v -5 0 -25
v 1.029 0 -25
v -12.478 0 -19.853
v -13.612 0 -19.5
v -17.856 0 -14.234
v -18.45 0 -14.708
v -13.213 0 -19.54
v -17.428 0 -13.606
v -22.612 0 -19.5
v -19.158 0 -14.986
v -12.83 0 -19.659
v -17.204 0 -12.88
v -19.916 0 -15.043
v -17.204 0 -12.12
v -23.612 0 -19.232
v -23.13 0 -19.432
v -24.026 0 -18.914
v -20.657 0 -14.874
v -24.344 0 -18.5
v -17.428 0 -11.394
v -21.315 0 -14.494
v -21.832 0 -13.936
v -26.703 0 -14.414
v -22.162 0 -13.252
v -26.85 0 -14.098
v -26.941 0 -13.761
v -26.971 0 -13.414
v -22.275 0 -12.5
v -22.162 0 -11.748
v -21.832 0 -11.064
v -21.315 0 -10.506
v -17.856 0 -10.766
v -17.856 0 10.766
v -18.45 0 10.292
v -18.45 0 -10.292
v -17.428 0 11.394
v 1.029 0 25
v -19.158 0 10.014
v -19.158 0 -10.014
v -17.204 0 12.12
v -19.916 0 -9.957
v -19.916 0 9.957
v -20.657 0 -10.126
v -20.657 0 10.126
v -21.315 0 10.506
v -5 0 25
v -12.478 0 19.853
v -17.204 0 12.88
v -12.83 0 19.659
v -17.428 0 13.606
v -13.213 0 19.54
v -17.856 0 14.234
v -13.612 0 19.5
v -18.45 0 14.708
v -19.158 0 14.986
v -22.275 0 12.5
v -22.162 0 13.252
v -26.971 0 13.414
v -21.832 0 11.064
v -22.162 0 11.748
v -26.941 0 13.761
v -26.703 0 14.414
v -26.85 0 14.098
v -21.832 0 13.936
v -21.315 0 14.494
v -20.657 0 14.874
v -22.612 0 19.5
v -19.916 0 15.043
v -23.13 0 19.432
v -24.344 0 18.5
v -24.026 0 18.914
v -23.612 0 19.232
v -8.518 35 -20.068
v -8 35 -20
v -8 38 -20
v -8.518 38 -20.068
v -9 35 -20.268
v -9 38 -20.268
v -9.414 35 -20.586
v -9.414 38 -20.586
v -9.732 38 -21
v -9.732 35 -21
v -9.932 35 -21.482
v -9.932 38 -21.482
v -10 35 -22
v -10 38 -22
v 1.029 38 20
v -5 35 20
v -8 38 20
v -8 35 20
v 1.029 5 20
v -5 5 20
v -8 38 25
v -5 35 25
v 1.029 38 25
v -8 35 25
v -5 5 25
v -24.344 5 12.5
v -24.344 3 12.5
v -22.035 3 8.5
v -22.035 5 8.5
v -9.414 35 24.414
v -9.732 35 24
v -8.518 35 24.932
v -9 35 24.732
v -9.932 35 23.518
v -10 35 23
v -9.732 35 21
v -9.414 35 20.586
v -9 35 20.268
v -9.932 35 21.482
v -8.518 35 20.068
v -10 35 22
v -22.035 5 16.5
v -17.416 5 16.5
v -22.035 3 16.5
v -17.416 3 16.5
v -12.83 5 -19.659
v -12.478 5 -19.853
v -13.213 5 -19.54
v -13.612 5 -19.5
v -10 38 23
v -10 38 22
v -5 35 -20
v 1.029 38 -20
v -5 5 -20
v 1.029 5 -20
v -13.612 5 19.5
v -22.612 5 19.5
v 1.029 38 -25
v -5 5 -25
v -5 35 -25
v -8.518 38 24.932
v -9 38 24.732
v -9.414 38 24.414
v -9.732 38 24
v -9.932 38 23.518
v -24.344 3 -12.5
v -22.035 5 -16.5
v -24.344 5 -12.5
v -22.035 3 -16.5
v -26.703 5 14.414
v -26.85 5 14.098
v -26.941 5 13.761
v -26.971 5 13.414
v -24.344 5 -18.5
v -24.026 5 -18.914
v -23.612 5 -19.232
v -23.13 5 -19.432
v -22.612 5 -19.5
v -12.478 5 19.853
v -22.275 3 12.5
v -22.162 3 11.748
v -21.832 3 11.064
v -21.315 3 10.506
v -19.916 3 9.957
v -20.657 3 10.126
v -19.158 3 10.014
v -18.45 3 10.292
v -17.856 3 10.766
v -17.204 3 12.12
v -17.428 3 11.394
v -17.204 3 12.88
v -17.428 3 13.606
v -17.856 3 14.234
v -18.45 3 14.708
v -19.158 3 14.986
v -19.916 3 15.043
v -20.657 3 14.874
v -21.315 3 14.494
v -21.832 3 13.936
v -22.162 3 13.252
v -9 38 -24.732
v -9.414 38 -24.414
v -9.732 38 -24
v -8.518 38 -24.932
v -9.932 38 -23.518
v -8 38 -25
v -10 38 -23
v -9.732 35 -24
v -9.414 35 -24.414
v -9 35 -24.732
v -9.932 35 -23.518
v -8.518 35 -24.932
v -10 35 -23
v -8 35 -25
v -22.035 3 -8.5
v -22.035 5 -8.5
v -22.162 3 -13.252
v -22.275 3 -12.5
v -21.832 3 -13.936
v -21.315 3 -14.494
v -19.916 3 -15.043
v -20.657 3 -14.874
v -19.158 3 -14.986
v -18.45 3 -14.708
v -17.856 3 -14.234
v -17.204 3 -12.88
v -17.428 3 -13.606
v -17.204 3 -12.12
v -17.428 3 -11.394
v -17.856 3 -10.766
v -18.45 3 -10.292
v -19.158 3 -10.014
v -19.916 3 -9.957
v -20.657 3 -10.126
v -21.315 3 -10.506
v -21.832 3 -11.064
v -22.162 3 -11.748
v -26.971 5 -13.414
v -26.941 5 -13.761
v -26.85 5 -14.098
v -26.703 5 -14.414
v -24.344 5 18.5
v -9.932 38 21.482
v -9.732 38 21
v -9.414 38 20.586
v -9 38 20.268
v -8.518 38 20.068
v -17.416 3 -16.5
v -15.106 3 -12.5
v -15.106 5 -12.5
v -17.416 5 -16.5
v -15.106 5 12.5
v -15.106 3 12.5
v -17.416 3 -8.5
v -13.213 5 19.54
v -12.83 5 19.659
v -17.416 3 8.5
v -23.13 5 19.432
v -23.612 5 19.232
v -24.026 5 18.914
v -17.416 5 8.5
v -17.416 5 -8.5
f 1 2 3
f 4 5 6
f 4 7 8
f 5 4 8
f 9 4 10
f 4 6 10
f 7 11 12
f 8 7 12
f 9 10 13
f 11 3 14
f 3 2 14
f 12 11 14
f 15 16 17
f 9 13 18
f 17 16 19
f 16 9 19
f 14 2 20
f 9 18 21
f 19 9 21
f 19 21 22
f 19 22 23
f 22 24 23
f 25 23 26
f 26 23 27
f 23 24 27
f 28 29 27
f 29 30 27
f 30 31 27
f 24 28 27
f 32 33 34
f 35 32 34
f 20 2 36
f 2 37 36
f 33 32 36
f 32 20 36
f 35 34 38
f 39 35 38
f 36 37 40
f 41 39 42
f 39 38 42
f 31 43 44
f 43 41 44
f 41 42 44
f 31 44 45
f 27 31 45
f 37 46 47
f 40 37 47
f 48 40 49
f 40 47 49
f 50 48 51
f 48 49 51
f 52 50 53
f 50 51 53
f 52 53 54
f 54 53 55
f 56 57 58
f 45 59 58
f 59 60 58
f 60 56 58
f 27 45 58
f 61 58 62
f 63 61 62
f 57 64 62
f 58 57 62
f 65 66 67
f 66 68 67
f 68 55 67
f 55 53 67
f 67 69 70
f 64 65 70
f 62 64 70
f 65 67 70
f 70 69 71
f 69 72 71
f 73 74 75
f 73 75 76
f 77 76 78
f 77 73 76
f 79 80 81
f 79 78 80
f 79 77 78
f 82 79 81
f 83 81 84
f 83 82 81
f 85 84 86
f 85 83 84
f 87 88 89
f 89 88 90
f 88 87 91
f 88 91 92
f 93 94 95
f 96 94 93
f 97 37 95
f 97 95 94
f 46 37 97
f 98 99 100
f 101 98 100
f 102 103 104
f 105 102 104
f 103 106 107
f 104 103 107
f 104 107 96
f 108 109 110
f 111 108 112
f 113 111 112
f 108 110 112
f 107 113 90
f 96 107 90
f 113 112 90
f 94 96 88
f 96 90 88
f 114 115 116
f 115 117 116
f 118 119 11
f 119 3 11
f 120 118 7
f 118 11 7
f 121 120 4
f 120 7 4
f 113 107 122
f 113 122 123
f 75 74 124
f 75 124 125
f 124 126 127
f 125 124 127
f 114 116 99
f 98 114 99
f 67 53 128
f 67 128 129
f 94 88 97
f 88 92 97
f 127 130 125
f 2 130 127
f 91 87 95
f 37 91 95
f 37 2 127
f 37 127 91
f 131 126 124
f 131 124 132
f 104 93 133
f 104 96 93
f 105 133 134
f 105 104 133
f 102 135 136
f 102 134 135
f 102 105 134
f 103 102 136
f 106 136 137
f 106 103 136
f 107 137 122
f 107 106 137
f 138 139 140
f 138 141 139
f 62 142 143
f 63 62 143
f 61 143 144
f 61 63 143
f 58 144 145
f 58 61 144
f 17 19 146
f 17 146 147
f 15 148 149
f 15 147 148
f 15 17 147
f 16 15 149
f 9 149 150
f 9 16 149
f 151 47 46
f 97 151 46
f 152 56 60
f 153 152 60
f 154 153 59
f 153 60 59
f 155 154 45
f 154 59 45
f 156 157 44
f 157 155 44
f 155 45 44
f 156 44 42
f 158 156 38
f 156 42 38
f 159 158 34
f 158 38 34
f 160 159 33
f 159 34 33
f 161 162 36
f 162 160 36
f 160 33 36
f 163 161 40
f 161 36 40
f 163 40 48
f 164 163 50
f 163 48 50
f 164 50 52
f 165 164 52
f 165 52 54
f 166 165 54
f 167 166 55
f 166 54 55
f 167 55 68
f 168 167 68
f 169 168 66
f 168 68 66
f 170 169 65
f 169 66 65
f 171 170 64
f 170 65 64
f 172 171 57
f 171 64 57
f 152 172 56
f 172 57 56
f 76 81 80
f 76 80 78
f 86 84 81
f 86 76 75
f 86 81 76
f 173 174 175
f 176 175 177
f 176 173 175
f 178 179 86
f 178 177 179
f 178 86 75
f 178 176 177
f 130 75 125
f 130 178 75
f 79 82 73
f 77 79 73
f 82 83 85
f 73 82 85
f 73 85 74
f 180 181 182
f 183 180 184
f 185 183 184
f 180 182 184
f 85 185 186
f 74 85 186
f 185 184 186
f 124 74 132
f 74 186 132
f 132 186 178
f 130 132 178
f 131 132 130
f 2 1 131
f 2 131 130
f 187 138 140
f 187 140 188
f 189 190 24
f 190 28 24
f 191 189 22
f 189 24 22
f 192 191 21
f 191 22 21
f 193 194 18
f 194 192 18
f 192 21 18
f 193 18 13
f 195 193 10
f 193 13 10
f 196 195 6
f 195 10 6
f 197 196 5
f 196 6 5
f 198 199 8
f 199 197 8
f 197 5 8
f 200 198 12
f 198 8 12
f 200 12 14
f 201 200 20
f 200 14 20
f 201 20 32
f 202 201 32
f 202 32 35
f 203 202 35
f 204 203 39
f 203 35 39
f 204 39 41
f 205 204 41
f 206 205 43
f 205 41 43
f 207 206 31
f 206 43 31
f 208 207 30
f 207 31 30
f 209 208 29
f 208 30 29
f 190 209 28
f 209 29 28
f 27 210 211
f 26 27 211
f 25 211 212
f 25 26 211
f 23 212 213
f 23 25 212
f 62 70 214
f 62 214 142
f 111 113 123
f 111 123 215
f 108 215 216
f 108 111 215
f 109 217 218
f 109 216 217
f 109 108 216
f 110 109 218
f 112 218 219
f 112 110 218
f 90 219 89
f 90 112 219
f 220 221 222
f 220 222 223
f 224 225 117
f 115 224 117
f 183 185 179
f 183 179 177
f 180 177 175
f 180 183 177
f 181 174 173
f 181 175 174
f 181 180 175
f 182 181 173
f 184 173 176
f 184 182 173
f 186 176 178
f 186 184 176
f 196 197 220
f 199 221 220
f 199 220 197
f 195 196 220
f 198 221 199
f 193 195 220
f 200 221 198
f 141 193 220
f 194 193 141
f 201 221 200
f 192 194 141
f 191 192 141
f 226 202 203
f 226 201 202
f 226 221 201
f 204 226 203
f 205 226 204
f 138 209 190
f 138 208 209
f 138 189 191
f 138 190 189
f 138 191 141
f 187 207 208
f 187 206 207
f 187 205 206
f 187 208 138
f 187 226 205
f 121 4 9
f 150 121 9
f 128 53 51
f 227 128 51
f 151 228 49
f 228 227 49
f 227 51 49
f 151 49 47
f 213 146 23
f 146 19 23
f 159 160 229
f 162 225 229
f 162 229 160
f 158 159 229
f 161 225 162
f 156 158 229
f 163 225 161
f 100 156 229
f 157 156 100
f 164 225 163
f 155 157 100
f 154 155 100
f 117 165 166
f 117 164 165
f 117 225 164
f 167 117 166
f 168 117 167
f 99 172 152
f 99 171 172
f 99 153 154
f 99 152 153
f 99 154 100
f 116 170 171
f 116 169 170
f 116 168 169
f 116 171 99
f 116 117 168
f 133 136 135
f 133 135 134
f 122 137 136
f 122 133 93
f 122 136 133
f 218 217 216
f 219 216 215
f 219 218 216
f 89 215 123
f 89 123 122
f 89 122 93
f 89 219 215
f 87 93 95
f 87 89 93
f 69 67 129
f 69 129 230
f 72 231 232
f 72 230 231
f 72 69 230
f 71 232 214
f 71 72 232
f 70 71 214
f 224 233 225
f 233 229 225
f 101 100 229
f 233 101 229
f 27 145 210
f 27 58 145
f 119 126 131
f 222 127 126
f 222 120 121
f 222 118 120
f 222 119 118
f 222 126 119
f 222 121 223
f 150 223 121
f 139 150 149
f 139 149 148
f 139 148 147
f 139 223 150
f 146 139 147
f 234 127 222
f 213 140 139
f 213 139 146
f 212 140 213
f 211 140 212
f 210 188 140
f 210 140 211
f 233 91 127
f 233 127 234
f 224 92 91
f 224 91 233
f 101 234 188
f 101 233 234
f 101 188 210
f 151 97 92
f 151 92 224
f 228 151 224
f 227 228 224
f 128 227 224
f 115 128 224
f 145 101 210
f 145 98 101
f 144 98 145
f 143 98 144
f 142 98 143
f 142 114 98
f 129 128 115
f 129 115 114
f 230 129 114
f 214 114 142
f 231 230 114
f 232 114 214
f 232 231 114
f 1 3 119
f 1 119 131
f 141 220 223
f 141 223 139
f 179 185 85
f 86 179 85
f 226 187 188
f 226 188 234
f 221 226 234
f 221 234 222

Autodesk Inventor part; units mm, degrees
ref_plane "YZ Plane" through (0, 0, 0) normal (1, 0, 0) x (0, 1, 0)
ref_plane "XZ Plane" through (0, 0, 0) normal (0, 1, 0) x (-1, 0, 0)
ref_plane "XY Plane" through (0, 0, 0) normal (0, 0, 1) x (1, 0, 0)
sketch "Sketch2" plane through (0, 0, 0) normal (0, 1, 0) x (-1, 0, 0)
  line L0 (15.1065, 12.5) -> (17.4159, 16.5)
  line L1 (17.4159, 16.5) -> (22.0347, 16.5)
  line L2 (22.0347, 16.5) -> (24.3441, 12.5)
  line L3 (24.3441, 12.5) -> (22.0347, 8.5)
  line L4 (22.0347, 8.5) -> (17.4159, 8.5)
  line L5 (17.4159, 8.5) -> (15.1065, 12.5)
  circle A0 centre (19.7253, 12.5) radius 2.55
  line L6 (13.6122, 19.5) -> (22.612, 19.5)
  line L7 (24.3441, 18.5) -> (26.7031, 14.414)
  line L8 (26.9711, 13.414) -> (26.9711, 0.8204)
  line L9 (13.6122, 19.5) -> (13.6603, 19.5)
  line L10 (0, 0) -> (8.2774, 0) construction
  line L11 (15.1065, -12.5) -> (17.4159, -16.5)
  line L12 (17.4159, -16.5) -> (22.0347, -16.5)
  line L13 (22.0347, -16.5) -> (24.3441, -12.5)
  line L14 (24.3441, -12.5) -> (22.0347, -8.5)
  line L15 (22.0347, -8.5) -> (17.4159, -8.5)
  line L16 (17.4159, -8.5) -> (15.1065, -12.5)
  circle A1 centre (19.7253, -12.5) radius 2.55
  line L17 (13.6603, -19.5) -> (22.612, -19.5)
  line L18 (24.3441, -18.5) -> (26.7031, -14.414)
  line L19 (26.9711, -13.414) -> (26.9711, -0.8204)
  line L20 (13.6122, -19.5) -> (13.6603, -19.5)
  line L21 (0, 25) -> (5, 25)
  line L22 (26.9711, 0.8204) -> (26.9711, -0.8204)
  line L23 (2, 20) -> (5, 20)
  line L24 (5, 20) -> (5, 25)
  line L25 (12.4782, 19.8526) -> (5, 25)
  arc A2 (12.4782, 19.8526) -> (13.6122, 19.5) centre (13.6122, 21.5) ccw
  arc A3 (24.3441, 18.5) -> (22.612, 19.5) centre (22.612, 17.5) ccw
  arc A4 (26.9711, 13.414) -> (26.7031, 14.414) centre (24.9711, 13.414) ccw
  line L26 (0, -25) -> (5, -25)
  line L27 (2, -20) -> (5, -20)
  line L28 (5, -20) -> (5, -25)
  line L29 (12.4782, -19.8526) -> (5, -25)
  arc A5 (13.6122, -19.5) -> (12.4782, -19.8526) centre (13.6122, -21.5) ccw
  arc A6 (22.612, -19.5) -> (24.3441, -18.5) centre (22.612, -17.5) ccw
  arc A7 (26.7031, -14.414) -> (26.9711, -13.414) centre (24.9711, -13.414) ccw
  line L30 (0, -25) -> (-1.0289, -25)
  line L31 (-1.0289, -25) -> (-1.0289, 25)
  line L32 (-1.0289, 25) -> (0, 25)
  line L33 (2, 20) -> (-1.0289, 20)
  line L34 (2, -20) -> (-1.0289, -20)
  point P0 (3, 23.2679)
  point P1 (19.7253, 8.5)
  point P2 (19.7253, 16.5)
  point P3 (23.7667, 19.5)
  point P4 (26.9711, 13.9499)
  point P5 (23.1894, 14.5)
  point P6 (12.9904, 19.5)
  point P7 (19.7253, -8.5)
  point P8 (19.7253, -16.5)
  point P9 (23.7667, -19.5)
  point P10 (26.9711, -13.9499)
  point P11 (23.1894, -14.5)
  point P12 (12.9904, -19.5)
  point P13 (25.239, 0.1796)
  point P14 (25.239, -0.1796)
  dimension "d18" = 8
  dimension "d19" = 5.1
  dimension "d21" = 3
  dimension "d22" = 3
  dimension "d27" = 25
  dimension "d33" = 5
  dimension "d34" = 2
  dimension "d35" = 2
  dimension "d36" = 2
  dimension "d37" = 2
  dimension "d48" = 28
extrude "Extrusion2" add sketch "Sketch2" along normal blind 35 contours L24 L23 L33 L31 L32 L21
extrude "Extrusion4" add sketch "Sketch2" along normal blind 3 contours L0 L1 L2 L3 L4 L5 | L16 L15 L14 L13 L12 L11
extrude "Extrusion6" add sketch "Sketch2" along normal blind 5 contours L6 A3 L7 A4 L8 L22 L19 A7 L18 A6 L17 L20 A5 L29 L28 L27 L34 L31 L33 L23 L24 L25 A2
extrude "Extrusion7" add sketch "Sketch2" along normal blind 35 contours L34 L27 L28 L26 L30 L31
sketch "Sketch4" plane through (0, 35, 0) normal (0, 1, 0) x (1, 0, 0)
  line L0 (-5, -25) -> (1.0289, -25) projected
  line L1 (0, -25) -> (-8, -25)
  line L2 (-10, -23) -> (-10, -22)
  line L3 (-8, -20) -> (0, -20)
  line L4 (0, 0) -> (-6.9228, 0) construction
  line L5 (0, 25) -> (-8, 25)
  line L6 (-10, 23) -> (-10, 22)
  line L7 (-8, 20) -> (0, 20)
  arc A0 (-10, -23) -> (-8, -25) centre (-8, -23) ccw
  arc A1 (-8, -20) -> (-10, -22) centre (-8, -22) ccw
  arc A2 (-10, 22) -> (-8, 20) centre (-8, 22) ccw
  arc A3 (-8, 25) -> (-10, 23) centre (-8, 23) ccw
  line L8 (1.0289, -20) -> (-5, -20) projected
  line L9 (0, -20) -> (1.0289, -20)
  line L10 (1.0289, -20) -> (1.0289, -25)
  line L11 (0, -25) -> (1.0289, -25)
  line L12 (-5, 20) -> (1.0289, 20) projected
  line L13 (0, 20) -> (1.0289, 20)
  line L14 (1.0289, 20) -> (1.0289, 25)
  line L15 (1.0289, 25) -> (0, 25)
  point P0 (-10, -20)
  point P1 (-10, -25)
  point P2 (-10, 20)
  point P3 (-10, 25)
  dimension "d42" = 10
  dimension "d43" = 5
  dimension "d44" = 2
extrude "Extrusion8" add sketch "Sketch4" along normal blind 3
properties part number "soporte_pinzas"
